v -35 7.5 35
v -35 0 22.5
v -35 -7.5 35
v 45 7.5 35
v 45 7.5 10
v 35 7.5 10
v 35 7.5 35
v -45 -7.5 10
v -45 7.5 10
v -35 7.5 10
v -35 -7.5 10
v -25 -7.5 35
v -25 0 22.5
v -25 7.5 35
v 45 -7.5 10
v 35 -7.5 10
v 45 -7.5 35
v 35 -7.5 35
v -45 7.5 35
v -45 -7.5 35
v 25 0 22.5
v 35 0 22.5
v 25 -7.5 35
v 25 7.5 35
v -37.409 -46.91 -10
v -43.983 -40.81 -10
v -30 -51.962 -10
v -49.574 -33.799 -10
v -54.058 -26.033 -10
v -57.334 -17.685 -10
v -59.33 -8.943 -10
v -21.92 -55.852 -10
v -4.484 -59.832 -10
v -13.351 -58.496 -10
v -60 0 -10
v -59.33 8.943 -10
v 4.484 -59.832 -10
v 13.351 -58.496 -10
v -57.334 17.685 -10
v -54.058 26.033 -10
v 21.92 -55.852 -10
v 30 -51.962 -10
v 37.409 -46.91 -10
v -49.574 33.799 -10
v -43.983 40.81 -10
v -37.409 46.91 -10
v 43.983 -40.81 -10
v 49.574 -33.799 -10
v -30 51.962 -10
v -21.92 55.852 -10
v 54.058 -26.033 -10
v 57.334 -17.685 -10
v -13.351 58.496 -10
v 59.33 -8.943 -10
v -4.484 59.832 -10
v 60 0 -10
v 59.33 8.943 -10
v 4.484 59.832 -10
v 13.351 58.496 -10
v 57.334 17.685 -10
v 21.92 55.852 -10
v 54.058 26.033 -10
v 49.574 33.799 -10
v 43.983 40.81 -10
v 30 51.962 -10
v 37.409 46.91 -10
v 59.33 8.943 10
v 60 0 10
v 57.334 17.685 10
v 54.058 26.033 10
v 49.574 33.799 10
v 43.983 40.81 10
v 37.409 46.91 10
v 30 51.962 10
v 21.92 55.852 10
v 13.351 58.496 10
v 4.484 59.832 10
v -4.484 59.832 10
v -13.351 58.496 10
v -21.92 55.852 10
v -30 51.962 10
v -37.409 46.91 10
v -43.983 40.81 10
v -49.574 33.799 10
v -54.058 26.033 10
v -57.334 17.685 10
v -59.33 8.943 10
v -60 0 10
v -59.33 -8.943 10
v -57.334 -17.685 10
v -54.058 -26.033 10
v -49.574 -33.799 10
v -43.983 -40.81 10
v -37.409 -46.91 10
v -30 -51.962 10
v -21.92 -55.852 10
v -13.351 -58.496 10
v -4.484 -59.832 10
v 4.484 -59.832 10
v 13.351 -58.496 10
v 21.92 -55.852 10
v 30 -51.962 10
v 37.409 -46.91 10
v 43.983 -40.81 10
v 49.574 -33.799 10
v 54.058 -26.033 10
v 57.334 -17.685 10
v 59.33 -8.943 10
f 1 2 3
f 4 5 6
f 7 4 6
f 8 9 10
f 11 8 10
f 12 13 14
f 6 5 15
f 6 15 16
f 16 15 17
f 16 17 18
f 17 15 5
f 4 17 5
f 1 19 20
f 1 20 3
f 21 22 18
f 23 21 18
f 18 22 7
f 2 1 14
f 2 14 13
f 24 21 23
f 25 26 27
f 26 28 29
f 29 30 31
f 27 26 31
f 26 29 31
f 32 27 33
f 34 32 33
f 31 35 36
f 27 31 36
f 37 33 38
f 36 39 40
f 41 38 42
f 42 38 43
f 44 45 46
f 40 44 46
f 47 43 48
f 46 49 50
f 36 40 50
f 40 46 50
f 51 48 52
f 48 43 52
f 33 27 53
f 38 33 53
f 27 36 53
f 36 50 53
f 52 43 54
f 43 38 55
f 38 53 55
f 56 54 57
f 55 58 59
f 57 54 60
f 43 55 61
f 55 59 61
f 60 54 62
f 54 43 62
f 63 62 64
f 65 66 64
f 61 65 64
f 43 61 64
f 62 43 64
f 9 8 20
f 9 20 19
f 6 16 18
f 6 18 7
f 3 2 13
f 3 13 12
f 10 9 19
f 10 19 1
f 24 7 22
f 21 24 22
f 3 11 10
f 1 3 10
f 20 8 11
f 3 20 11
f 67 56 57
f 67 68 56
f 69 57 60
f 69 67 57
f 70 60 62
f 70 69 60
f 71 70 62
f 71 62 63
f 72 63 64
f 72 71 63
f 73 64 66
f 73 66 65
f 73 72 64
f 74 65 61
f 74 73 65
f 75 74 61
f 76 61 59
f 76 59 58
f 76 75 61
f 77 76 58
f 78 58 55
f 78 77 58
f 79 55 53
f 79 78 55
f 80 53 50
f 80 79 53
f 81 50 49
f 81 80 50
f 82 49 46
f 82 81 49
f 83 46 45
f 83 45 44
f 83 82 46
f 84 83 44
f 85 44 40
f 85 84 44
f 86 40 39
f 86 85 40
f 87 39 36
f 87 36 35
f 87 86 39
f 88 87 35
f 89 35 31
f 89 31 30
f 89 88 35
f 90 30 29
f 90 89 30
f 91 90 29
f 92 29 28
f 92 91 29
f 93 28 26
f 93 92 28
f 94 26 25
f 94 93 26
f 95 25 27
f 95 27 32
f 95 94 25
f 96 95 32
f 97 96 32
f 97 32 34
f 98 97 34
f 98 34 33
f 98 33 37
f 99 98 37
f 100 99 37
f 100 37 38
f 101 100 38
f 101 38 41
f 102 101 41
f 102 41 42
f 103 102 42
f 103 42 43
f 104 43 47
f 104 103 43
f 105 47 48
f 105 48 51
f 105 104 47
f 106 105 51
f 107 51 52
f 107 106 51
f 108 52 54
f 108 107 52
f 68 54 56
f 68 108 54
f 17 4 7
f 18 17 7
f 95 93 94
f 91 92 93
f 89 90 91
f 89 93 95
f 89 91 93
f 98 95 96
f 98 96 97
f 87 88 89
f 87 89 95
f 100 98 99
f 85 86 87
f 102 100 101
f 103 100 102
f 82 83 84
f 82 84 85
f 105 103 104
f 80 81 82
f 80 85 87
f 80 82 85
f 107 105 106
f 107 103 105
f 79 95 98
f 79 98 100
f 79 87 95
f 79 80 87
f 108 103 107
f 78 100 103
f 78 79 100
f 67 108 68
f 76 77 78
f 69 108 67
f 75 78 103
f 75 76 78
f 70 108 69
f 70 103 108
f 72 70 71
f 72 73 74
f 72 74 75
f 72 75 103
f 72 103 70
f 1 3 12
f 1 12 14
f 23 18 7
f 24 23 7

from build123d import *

# Parameters (mm, degrees)
SKETCH_1_R      = 60
EXTRUDE_1_DEPTH = 10
SKETCH_2_W      = 10
SKETCH_2_H      = 15
EXTRUDE_2_DEPTH = 25
EXTRUDE_3_DEPTH = 10


with BuildPart() as part:
    # 草图1 → 凸台-拉伸1 (new, symmetric)
    with BuildSketch(Plane.XY):
        Circle(SKETCH_1_R)
    extrude(amount=EXTRUDE_1_DEPTH, both=True)


with BuildPart() as body_2:
    # 草图2 → 凸台-拉伸2 (new body)
    with BuildSketch(Plane.XY.offset(10)):
        with Locations((-40, 0)):
            Rectangle(SKETCH_2_W, SKETCH_2_H)
    extrude(amount=EXTRUDE_2_DEPTH)


with BuildPart() as body_3:
    # 草图4 → 凸台-拉伸3 (new body)
    with BuildSketch(Plane(origin=(-35, 0, 0), x_dir=(0, 0, -1), z_dir=(1, 0, 0))):
        Polygon((-35, 7.5), (-22.5, 0), (-35, -7.5), align=None)
    extrude(amount=EXTRUDE_3_DEPTH)


with BuildPart() as body_4:
    # 镜向1: mirrored copy
    add(body_3.part.mirror(Plane(origin=(0, 0, 0), x_dir=(0, 0, 1), z_dir=(1, 0, 0))))


with BuildPart() as body_5:
    # Mirror 1 2: mirrored copy
    add(body_2.part.mirror(Plane(origin=(0, 0, 0), x_dir=(0, 0, 1), z_dir=(1, 0, 0))))


solid = Compound([part.part, body_2.part, body_3.part, body_4.part, body_5.part])
